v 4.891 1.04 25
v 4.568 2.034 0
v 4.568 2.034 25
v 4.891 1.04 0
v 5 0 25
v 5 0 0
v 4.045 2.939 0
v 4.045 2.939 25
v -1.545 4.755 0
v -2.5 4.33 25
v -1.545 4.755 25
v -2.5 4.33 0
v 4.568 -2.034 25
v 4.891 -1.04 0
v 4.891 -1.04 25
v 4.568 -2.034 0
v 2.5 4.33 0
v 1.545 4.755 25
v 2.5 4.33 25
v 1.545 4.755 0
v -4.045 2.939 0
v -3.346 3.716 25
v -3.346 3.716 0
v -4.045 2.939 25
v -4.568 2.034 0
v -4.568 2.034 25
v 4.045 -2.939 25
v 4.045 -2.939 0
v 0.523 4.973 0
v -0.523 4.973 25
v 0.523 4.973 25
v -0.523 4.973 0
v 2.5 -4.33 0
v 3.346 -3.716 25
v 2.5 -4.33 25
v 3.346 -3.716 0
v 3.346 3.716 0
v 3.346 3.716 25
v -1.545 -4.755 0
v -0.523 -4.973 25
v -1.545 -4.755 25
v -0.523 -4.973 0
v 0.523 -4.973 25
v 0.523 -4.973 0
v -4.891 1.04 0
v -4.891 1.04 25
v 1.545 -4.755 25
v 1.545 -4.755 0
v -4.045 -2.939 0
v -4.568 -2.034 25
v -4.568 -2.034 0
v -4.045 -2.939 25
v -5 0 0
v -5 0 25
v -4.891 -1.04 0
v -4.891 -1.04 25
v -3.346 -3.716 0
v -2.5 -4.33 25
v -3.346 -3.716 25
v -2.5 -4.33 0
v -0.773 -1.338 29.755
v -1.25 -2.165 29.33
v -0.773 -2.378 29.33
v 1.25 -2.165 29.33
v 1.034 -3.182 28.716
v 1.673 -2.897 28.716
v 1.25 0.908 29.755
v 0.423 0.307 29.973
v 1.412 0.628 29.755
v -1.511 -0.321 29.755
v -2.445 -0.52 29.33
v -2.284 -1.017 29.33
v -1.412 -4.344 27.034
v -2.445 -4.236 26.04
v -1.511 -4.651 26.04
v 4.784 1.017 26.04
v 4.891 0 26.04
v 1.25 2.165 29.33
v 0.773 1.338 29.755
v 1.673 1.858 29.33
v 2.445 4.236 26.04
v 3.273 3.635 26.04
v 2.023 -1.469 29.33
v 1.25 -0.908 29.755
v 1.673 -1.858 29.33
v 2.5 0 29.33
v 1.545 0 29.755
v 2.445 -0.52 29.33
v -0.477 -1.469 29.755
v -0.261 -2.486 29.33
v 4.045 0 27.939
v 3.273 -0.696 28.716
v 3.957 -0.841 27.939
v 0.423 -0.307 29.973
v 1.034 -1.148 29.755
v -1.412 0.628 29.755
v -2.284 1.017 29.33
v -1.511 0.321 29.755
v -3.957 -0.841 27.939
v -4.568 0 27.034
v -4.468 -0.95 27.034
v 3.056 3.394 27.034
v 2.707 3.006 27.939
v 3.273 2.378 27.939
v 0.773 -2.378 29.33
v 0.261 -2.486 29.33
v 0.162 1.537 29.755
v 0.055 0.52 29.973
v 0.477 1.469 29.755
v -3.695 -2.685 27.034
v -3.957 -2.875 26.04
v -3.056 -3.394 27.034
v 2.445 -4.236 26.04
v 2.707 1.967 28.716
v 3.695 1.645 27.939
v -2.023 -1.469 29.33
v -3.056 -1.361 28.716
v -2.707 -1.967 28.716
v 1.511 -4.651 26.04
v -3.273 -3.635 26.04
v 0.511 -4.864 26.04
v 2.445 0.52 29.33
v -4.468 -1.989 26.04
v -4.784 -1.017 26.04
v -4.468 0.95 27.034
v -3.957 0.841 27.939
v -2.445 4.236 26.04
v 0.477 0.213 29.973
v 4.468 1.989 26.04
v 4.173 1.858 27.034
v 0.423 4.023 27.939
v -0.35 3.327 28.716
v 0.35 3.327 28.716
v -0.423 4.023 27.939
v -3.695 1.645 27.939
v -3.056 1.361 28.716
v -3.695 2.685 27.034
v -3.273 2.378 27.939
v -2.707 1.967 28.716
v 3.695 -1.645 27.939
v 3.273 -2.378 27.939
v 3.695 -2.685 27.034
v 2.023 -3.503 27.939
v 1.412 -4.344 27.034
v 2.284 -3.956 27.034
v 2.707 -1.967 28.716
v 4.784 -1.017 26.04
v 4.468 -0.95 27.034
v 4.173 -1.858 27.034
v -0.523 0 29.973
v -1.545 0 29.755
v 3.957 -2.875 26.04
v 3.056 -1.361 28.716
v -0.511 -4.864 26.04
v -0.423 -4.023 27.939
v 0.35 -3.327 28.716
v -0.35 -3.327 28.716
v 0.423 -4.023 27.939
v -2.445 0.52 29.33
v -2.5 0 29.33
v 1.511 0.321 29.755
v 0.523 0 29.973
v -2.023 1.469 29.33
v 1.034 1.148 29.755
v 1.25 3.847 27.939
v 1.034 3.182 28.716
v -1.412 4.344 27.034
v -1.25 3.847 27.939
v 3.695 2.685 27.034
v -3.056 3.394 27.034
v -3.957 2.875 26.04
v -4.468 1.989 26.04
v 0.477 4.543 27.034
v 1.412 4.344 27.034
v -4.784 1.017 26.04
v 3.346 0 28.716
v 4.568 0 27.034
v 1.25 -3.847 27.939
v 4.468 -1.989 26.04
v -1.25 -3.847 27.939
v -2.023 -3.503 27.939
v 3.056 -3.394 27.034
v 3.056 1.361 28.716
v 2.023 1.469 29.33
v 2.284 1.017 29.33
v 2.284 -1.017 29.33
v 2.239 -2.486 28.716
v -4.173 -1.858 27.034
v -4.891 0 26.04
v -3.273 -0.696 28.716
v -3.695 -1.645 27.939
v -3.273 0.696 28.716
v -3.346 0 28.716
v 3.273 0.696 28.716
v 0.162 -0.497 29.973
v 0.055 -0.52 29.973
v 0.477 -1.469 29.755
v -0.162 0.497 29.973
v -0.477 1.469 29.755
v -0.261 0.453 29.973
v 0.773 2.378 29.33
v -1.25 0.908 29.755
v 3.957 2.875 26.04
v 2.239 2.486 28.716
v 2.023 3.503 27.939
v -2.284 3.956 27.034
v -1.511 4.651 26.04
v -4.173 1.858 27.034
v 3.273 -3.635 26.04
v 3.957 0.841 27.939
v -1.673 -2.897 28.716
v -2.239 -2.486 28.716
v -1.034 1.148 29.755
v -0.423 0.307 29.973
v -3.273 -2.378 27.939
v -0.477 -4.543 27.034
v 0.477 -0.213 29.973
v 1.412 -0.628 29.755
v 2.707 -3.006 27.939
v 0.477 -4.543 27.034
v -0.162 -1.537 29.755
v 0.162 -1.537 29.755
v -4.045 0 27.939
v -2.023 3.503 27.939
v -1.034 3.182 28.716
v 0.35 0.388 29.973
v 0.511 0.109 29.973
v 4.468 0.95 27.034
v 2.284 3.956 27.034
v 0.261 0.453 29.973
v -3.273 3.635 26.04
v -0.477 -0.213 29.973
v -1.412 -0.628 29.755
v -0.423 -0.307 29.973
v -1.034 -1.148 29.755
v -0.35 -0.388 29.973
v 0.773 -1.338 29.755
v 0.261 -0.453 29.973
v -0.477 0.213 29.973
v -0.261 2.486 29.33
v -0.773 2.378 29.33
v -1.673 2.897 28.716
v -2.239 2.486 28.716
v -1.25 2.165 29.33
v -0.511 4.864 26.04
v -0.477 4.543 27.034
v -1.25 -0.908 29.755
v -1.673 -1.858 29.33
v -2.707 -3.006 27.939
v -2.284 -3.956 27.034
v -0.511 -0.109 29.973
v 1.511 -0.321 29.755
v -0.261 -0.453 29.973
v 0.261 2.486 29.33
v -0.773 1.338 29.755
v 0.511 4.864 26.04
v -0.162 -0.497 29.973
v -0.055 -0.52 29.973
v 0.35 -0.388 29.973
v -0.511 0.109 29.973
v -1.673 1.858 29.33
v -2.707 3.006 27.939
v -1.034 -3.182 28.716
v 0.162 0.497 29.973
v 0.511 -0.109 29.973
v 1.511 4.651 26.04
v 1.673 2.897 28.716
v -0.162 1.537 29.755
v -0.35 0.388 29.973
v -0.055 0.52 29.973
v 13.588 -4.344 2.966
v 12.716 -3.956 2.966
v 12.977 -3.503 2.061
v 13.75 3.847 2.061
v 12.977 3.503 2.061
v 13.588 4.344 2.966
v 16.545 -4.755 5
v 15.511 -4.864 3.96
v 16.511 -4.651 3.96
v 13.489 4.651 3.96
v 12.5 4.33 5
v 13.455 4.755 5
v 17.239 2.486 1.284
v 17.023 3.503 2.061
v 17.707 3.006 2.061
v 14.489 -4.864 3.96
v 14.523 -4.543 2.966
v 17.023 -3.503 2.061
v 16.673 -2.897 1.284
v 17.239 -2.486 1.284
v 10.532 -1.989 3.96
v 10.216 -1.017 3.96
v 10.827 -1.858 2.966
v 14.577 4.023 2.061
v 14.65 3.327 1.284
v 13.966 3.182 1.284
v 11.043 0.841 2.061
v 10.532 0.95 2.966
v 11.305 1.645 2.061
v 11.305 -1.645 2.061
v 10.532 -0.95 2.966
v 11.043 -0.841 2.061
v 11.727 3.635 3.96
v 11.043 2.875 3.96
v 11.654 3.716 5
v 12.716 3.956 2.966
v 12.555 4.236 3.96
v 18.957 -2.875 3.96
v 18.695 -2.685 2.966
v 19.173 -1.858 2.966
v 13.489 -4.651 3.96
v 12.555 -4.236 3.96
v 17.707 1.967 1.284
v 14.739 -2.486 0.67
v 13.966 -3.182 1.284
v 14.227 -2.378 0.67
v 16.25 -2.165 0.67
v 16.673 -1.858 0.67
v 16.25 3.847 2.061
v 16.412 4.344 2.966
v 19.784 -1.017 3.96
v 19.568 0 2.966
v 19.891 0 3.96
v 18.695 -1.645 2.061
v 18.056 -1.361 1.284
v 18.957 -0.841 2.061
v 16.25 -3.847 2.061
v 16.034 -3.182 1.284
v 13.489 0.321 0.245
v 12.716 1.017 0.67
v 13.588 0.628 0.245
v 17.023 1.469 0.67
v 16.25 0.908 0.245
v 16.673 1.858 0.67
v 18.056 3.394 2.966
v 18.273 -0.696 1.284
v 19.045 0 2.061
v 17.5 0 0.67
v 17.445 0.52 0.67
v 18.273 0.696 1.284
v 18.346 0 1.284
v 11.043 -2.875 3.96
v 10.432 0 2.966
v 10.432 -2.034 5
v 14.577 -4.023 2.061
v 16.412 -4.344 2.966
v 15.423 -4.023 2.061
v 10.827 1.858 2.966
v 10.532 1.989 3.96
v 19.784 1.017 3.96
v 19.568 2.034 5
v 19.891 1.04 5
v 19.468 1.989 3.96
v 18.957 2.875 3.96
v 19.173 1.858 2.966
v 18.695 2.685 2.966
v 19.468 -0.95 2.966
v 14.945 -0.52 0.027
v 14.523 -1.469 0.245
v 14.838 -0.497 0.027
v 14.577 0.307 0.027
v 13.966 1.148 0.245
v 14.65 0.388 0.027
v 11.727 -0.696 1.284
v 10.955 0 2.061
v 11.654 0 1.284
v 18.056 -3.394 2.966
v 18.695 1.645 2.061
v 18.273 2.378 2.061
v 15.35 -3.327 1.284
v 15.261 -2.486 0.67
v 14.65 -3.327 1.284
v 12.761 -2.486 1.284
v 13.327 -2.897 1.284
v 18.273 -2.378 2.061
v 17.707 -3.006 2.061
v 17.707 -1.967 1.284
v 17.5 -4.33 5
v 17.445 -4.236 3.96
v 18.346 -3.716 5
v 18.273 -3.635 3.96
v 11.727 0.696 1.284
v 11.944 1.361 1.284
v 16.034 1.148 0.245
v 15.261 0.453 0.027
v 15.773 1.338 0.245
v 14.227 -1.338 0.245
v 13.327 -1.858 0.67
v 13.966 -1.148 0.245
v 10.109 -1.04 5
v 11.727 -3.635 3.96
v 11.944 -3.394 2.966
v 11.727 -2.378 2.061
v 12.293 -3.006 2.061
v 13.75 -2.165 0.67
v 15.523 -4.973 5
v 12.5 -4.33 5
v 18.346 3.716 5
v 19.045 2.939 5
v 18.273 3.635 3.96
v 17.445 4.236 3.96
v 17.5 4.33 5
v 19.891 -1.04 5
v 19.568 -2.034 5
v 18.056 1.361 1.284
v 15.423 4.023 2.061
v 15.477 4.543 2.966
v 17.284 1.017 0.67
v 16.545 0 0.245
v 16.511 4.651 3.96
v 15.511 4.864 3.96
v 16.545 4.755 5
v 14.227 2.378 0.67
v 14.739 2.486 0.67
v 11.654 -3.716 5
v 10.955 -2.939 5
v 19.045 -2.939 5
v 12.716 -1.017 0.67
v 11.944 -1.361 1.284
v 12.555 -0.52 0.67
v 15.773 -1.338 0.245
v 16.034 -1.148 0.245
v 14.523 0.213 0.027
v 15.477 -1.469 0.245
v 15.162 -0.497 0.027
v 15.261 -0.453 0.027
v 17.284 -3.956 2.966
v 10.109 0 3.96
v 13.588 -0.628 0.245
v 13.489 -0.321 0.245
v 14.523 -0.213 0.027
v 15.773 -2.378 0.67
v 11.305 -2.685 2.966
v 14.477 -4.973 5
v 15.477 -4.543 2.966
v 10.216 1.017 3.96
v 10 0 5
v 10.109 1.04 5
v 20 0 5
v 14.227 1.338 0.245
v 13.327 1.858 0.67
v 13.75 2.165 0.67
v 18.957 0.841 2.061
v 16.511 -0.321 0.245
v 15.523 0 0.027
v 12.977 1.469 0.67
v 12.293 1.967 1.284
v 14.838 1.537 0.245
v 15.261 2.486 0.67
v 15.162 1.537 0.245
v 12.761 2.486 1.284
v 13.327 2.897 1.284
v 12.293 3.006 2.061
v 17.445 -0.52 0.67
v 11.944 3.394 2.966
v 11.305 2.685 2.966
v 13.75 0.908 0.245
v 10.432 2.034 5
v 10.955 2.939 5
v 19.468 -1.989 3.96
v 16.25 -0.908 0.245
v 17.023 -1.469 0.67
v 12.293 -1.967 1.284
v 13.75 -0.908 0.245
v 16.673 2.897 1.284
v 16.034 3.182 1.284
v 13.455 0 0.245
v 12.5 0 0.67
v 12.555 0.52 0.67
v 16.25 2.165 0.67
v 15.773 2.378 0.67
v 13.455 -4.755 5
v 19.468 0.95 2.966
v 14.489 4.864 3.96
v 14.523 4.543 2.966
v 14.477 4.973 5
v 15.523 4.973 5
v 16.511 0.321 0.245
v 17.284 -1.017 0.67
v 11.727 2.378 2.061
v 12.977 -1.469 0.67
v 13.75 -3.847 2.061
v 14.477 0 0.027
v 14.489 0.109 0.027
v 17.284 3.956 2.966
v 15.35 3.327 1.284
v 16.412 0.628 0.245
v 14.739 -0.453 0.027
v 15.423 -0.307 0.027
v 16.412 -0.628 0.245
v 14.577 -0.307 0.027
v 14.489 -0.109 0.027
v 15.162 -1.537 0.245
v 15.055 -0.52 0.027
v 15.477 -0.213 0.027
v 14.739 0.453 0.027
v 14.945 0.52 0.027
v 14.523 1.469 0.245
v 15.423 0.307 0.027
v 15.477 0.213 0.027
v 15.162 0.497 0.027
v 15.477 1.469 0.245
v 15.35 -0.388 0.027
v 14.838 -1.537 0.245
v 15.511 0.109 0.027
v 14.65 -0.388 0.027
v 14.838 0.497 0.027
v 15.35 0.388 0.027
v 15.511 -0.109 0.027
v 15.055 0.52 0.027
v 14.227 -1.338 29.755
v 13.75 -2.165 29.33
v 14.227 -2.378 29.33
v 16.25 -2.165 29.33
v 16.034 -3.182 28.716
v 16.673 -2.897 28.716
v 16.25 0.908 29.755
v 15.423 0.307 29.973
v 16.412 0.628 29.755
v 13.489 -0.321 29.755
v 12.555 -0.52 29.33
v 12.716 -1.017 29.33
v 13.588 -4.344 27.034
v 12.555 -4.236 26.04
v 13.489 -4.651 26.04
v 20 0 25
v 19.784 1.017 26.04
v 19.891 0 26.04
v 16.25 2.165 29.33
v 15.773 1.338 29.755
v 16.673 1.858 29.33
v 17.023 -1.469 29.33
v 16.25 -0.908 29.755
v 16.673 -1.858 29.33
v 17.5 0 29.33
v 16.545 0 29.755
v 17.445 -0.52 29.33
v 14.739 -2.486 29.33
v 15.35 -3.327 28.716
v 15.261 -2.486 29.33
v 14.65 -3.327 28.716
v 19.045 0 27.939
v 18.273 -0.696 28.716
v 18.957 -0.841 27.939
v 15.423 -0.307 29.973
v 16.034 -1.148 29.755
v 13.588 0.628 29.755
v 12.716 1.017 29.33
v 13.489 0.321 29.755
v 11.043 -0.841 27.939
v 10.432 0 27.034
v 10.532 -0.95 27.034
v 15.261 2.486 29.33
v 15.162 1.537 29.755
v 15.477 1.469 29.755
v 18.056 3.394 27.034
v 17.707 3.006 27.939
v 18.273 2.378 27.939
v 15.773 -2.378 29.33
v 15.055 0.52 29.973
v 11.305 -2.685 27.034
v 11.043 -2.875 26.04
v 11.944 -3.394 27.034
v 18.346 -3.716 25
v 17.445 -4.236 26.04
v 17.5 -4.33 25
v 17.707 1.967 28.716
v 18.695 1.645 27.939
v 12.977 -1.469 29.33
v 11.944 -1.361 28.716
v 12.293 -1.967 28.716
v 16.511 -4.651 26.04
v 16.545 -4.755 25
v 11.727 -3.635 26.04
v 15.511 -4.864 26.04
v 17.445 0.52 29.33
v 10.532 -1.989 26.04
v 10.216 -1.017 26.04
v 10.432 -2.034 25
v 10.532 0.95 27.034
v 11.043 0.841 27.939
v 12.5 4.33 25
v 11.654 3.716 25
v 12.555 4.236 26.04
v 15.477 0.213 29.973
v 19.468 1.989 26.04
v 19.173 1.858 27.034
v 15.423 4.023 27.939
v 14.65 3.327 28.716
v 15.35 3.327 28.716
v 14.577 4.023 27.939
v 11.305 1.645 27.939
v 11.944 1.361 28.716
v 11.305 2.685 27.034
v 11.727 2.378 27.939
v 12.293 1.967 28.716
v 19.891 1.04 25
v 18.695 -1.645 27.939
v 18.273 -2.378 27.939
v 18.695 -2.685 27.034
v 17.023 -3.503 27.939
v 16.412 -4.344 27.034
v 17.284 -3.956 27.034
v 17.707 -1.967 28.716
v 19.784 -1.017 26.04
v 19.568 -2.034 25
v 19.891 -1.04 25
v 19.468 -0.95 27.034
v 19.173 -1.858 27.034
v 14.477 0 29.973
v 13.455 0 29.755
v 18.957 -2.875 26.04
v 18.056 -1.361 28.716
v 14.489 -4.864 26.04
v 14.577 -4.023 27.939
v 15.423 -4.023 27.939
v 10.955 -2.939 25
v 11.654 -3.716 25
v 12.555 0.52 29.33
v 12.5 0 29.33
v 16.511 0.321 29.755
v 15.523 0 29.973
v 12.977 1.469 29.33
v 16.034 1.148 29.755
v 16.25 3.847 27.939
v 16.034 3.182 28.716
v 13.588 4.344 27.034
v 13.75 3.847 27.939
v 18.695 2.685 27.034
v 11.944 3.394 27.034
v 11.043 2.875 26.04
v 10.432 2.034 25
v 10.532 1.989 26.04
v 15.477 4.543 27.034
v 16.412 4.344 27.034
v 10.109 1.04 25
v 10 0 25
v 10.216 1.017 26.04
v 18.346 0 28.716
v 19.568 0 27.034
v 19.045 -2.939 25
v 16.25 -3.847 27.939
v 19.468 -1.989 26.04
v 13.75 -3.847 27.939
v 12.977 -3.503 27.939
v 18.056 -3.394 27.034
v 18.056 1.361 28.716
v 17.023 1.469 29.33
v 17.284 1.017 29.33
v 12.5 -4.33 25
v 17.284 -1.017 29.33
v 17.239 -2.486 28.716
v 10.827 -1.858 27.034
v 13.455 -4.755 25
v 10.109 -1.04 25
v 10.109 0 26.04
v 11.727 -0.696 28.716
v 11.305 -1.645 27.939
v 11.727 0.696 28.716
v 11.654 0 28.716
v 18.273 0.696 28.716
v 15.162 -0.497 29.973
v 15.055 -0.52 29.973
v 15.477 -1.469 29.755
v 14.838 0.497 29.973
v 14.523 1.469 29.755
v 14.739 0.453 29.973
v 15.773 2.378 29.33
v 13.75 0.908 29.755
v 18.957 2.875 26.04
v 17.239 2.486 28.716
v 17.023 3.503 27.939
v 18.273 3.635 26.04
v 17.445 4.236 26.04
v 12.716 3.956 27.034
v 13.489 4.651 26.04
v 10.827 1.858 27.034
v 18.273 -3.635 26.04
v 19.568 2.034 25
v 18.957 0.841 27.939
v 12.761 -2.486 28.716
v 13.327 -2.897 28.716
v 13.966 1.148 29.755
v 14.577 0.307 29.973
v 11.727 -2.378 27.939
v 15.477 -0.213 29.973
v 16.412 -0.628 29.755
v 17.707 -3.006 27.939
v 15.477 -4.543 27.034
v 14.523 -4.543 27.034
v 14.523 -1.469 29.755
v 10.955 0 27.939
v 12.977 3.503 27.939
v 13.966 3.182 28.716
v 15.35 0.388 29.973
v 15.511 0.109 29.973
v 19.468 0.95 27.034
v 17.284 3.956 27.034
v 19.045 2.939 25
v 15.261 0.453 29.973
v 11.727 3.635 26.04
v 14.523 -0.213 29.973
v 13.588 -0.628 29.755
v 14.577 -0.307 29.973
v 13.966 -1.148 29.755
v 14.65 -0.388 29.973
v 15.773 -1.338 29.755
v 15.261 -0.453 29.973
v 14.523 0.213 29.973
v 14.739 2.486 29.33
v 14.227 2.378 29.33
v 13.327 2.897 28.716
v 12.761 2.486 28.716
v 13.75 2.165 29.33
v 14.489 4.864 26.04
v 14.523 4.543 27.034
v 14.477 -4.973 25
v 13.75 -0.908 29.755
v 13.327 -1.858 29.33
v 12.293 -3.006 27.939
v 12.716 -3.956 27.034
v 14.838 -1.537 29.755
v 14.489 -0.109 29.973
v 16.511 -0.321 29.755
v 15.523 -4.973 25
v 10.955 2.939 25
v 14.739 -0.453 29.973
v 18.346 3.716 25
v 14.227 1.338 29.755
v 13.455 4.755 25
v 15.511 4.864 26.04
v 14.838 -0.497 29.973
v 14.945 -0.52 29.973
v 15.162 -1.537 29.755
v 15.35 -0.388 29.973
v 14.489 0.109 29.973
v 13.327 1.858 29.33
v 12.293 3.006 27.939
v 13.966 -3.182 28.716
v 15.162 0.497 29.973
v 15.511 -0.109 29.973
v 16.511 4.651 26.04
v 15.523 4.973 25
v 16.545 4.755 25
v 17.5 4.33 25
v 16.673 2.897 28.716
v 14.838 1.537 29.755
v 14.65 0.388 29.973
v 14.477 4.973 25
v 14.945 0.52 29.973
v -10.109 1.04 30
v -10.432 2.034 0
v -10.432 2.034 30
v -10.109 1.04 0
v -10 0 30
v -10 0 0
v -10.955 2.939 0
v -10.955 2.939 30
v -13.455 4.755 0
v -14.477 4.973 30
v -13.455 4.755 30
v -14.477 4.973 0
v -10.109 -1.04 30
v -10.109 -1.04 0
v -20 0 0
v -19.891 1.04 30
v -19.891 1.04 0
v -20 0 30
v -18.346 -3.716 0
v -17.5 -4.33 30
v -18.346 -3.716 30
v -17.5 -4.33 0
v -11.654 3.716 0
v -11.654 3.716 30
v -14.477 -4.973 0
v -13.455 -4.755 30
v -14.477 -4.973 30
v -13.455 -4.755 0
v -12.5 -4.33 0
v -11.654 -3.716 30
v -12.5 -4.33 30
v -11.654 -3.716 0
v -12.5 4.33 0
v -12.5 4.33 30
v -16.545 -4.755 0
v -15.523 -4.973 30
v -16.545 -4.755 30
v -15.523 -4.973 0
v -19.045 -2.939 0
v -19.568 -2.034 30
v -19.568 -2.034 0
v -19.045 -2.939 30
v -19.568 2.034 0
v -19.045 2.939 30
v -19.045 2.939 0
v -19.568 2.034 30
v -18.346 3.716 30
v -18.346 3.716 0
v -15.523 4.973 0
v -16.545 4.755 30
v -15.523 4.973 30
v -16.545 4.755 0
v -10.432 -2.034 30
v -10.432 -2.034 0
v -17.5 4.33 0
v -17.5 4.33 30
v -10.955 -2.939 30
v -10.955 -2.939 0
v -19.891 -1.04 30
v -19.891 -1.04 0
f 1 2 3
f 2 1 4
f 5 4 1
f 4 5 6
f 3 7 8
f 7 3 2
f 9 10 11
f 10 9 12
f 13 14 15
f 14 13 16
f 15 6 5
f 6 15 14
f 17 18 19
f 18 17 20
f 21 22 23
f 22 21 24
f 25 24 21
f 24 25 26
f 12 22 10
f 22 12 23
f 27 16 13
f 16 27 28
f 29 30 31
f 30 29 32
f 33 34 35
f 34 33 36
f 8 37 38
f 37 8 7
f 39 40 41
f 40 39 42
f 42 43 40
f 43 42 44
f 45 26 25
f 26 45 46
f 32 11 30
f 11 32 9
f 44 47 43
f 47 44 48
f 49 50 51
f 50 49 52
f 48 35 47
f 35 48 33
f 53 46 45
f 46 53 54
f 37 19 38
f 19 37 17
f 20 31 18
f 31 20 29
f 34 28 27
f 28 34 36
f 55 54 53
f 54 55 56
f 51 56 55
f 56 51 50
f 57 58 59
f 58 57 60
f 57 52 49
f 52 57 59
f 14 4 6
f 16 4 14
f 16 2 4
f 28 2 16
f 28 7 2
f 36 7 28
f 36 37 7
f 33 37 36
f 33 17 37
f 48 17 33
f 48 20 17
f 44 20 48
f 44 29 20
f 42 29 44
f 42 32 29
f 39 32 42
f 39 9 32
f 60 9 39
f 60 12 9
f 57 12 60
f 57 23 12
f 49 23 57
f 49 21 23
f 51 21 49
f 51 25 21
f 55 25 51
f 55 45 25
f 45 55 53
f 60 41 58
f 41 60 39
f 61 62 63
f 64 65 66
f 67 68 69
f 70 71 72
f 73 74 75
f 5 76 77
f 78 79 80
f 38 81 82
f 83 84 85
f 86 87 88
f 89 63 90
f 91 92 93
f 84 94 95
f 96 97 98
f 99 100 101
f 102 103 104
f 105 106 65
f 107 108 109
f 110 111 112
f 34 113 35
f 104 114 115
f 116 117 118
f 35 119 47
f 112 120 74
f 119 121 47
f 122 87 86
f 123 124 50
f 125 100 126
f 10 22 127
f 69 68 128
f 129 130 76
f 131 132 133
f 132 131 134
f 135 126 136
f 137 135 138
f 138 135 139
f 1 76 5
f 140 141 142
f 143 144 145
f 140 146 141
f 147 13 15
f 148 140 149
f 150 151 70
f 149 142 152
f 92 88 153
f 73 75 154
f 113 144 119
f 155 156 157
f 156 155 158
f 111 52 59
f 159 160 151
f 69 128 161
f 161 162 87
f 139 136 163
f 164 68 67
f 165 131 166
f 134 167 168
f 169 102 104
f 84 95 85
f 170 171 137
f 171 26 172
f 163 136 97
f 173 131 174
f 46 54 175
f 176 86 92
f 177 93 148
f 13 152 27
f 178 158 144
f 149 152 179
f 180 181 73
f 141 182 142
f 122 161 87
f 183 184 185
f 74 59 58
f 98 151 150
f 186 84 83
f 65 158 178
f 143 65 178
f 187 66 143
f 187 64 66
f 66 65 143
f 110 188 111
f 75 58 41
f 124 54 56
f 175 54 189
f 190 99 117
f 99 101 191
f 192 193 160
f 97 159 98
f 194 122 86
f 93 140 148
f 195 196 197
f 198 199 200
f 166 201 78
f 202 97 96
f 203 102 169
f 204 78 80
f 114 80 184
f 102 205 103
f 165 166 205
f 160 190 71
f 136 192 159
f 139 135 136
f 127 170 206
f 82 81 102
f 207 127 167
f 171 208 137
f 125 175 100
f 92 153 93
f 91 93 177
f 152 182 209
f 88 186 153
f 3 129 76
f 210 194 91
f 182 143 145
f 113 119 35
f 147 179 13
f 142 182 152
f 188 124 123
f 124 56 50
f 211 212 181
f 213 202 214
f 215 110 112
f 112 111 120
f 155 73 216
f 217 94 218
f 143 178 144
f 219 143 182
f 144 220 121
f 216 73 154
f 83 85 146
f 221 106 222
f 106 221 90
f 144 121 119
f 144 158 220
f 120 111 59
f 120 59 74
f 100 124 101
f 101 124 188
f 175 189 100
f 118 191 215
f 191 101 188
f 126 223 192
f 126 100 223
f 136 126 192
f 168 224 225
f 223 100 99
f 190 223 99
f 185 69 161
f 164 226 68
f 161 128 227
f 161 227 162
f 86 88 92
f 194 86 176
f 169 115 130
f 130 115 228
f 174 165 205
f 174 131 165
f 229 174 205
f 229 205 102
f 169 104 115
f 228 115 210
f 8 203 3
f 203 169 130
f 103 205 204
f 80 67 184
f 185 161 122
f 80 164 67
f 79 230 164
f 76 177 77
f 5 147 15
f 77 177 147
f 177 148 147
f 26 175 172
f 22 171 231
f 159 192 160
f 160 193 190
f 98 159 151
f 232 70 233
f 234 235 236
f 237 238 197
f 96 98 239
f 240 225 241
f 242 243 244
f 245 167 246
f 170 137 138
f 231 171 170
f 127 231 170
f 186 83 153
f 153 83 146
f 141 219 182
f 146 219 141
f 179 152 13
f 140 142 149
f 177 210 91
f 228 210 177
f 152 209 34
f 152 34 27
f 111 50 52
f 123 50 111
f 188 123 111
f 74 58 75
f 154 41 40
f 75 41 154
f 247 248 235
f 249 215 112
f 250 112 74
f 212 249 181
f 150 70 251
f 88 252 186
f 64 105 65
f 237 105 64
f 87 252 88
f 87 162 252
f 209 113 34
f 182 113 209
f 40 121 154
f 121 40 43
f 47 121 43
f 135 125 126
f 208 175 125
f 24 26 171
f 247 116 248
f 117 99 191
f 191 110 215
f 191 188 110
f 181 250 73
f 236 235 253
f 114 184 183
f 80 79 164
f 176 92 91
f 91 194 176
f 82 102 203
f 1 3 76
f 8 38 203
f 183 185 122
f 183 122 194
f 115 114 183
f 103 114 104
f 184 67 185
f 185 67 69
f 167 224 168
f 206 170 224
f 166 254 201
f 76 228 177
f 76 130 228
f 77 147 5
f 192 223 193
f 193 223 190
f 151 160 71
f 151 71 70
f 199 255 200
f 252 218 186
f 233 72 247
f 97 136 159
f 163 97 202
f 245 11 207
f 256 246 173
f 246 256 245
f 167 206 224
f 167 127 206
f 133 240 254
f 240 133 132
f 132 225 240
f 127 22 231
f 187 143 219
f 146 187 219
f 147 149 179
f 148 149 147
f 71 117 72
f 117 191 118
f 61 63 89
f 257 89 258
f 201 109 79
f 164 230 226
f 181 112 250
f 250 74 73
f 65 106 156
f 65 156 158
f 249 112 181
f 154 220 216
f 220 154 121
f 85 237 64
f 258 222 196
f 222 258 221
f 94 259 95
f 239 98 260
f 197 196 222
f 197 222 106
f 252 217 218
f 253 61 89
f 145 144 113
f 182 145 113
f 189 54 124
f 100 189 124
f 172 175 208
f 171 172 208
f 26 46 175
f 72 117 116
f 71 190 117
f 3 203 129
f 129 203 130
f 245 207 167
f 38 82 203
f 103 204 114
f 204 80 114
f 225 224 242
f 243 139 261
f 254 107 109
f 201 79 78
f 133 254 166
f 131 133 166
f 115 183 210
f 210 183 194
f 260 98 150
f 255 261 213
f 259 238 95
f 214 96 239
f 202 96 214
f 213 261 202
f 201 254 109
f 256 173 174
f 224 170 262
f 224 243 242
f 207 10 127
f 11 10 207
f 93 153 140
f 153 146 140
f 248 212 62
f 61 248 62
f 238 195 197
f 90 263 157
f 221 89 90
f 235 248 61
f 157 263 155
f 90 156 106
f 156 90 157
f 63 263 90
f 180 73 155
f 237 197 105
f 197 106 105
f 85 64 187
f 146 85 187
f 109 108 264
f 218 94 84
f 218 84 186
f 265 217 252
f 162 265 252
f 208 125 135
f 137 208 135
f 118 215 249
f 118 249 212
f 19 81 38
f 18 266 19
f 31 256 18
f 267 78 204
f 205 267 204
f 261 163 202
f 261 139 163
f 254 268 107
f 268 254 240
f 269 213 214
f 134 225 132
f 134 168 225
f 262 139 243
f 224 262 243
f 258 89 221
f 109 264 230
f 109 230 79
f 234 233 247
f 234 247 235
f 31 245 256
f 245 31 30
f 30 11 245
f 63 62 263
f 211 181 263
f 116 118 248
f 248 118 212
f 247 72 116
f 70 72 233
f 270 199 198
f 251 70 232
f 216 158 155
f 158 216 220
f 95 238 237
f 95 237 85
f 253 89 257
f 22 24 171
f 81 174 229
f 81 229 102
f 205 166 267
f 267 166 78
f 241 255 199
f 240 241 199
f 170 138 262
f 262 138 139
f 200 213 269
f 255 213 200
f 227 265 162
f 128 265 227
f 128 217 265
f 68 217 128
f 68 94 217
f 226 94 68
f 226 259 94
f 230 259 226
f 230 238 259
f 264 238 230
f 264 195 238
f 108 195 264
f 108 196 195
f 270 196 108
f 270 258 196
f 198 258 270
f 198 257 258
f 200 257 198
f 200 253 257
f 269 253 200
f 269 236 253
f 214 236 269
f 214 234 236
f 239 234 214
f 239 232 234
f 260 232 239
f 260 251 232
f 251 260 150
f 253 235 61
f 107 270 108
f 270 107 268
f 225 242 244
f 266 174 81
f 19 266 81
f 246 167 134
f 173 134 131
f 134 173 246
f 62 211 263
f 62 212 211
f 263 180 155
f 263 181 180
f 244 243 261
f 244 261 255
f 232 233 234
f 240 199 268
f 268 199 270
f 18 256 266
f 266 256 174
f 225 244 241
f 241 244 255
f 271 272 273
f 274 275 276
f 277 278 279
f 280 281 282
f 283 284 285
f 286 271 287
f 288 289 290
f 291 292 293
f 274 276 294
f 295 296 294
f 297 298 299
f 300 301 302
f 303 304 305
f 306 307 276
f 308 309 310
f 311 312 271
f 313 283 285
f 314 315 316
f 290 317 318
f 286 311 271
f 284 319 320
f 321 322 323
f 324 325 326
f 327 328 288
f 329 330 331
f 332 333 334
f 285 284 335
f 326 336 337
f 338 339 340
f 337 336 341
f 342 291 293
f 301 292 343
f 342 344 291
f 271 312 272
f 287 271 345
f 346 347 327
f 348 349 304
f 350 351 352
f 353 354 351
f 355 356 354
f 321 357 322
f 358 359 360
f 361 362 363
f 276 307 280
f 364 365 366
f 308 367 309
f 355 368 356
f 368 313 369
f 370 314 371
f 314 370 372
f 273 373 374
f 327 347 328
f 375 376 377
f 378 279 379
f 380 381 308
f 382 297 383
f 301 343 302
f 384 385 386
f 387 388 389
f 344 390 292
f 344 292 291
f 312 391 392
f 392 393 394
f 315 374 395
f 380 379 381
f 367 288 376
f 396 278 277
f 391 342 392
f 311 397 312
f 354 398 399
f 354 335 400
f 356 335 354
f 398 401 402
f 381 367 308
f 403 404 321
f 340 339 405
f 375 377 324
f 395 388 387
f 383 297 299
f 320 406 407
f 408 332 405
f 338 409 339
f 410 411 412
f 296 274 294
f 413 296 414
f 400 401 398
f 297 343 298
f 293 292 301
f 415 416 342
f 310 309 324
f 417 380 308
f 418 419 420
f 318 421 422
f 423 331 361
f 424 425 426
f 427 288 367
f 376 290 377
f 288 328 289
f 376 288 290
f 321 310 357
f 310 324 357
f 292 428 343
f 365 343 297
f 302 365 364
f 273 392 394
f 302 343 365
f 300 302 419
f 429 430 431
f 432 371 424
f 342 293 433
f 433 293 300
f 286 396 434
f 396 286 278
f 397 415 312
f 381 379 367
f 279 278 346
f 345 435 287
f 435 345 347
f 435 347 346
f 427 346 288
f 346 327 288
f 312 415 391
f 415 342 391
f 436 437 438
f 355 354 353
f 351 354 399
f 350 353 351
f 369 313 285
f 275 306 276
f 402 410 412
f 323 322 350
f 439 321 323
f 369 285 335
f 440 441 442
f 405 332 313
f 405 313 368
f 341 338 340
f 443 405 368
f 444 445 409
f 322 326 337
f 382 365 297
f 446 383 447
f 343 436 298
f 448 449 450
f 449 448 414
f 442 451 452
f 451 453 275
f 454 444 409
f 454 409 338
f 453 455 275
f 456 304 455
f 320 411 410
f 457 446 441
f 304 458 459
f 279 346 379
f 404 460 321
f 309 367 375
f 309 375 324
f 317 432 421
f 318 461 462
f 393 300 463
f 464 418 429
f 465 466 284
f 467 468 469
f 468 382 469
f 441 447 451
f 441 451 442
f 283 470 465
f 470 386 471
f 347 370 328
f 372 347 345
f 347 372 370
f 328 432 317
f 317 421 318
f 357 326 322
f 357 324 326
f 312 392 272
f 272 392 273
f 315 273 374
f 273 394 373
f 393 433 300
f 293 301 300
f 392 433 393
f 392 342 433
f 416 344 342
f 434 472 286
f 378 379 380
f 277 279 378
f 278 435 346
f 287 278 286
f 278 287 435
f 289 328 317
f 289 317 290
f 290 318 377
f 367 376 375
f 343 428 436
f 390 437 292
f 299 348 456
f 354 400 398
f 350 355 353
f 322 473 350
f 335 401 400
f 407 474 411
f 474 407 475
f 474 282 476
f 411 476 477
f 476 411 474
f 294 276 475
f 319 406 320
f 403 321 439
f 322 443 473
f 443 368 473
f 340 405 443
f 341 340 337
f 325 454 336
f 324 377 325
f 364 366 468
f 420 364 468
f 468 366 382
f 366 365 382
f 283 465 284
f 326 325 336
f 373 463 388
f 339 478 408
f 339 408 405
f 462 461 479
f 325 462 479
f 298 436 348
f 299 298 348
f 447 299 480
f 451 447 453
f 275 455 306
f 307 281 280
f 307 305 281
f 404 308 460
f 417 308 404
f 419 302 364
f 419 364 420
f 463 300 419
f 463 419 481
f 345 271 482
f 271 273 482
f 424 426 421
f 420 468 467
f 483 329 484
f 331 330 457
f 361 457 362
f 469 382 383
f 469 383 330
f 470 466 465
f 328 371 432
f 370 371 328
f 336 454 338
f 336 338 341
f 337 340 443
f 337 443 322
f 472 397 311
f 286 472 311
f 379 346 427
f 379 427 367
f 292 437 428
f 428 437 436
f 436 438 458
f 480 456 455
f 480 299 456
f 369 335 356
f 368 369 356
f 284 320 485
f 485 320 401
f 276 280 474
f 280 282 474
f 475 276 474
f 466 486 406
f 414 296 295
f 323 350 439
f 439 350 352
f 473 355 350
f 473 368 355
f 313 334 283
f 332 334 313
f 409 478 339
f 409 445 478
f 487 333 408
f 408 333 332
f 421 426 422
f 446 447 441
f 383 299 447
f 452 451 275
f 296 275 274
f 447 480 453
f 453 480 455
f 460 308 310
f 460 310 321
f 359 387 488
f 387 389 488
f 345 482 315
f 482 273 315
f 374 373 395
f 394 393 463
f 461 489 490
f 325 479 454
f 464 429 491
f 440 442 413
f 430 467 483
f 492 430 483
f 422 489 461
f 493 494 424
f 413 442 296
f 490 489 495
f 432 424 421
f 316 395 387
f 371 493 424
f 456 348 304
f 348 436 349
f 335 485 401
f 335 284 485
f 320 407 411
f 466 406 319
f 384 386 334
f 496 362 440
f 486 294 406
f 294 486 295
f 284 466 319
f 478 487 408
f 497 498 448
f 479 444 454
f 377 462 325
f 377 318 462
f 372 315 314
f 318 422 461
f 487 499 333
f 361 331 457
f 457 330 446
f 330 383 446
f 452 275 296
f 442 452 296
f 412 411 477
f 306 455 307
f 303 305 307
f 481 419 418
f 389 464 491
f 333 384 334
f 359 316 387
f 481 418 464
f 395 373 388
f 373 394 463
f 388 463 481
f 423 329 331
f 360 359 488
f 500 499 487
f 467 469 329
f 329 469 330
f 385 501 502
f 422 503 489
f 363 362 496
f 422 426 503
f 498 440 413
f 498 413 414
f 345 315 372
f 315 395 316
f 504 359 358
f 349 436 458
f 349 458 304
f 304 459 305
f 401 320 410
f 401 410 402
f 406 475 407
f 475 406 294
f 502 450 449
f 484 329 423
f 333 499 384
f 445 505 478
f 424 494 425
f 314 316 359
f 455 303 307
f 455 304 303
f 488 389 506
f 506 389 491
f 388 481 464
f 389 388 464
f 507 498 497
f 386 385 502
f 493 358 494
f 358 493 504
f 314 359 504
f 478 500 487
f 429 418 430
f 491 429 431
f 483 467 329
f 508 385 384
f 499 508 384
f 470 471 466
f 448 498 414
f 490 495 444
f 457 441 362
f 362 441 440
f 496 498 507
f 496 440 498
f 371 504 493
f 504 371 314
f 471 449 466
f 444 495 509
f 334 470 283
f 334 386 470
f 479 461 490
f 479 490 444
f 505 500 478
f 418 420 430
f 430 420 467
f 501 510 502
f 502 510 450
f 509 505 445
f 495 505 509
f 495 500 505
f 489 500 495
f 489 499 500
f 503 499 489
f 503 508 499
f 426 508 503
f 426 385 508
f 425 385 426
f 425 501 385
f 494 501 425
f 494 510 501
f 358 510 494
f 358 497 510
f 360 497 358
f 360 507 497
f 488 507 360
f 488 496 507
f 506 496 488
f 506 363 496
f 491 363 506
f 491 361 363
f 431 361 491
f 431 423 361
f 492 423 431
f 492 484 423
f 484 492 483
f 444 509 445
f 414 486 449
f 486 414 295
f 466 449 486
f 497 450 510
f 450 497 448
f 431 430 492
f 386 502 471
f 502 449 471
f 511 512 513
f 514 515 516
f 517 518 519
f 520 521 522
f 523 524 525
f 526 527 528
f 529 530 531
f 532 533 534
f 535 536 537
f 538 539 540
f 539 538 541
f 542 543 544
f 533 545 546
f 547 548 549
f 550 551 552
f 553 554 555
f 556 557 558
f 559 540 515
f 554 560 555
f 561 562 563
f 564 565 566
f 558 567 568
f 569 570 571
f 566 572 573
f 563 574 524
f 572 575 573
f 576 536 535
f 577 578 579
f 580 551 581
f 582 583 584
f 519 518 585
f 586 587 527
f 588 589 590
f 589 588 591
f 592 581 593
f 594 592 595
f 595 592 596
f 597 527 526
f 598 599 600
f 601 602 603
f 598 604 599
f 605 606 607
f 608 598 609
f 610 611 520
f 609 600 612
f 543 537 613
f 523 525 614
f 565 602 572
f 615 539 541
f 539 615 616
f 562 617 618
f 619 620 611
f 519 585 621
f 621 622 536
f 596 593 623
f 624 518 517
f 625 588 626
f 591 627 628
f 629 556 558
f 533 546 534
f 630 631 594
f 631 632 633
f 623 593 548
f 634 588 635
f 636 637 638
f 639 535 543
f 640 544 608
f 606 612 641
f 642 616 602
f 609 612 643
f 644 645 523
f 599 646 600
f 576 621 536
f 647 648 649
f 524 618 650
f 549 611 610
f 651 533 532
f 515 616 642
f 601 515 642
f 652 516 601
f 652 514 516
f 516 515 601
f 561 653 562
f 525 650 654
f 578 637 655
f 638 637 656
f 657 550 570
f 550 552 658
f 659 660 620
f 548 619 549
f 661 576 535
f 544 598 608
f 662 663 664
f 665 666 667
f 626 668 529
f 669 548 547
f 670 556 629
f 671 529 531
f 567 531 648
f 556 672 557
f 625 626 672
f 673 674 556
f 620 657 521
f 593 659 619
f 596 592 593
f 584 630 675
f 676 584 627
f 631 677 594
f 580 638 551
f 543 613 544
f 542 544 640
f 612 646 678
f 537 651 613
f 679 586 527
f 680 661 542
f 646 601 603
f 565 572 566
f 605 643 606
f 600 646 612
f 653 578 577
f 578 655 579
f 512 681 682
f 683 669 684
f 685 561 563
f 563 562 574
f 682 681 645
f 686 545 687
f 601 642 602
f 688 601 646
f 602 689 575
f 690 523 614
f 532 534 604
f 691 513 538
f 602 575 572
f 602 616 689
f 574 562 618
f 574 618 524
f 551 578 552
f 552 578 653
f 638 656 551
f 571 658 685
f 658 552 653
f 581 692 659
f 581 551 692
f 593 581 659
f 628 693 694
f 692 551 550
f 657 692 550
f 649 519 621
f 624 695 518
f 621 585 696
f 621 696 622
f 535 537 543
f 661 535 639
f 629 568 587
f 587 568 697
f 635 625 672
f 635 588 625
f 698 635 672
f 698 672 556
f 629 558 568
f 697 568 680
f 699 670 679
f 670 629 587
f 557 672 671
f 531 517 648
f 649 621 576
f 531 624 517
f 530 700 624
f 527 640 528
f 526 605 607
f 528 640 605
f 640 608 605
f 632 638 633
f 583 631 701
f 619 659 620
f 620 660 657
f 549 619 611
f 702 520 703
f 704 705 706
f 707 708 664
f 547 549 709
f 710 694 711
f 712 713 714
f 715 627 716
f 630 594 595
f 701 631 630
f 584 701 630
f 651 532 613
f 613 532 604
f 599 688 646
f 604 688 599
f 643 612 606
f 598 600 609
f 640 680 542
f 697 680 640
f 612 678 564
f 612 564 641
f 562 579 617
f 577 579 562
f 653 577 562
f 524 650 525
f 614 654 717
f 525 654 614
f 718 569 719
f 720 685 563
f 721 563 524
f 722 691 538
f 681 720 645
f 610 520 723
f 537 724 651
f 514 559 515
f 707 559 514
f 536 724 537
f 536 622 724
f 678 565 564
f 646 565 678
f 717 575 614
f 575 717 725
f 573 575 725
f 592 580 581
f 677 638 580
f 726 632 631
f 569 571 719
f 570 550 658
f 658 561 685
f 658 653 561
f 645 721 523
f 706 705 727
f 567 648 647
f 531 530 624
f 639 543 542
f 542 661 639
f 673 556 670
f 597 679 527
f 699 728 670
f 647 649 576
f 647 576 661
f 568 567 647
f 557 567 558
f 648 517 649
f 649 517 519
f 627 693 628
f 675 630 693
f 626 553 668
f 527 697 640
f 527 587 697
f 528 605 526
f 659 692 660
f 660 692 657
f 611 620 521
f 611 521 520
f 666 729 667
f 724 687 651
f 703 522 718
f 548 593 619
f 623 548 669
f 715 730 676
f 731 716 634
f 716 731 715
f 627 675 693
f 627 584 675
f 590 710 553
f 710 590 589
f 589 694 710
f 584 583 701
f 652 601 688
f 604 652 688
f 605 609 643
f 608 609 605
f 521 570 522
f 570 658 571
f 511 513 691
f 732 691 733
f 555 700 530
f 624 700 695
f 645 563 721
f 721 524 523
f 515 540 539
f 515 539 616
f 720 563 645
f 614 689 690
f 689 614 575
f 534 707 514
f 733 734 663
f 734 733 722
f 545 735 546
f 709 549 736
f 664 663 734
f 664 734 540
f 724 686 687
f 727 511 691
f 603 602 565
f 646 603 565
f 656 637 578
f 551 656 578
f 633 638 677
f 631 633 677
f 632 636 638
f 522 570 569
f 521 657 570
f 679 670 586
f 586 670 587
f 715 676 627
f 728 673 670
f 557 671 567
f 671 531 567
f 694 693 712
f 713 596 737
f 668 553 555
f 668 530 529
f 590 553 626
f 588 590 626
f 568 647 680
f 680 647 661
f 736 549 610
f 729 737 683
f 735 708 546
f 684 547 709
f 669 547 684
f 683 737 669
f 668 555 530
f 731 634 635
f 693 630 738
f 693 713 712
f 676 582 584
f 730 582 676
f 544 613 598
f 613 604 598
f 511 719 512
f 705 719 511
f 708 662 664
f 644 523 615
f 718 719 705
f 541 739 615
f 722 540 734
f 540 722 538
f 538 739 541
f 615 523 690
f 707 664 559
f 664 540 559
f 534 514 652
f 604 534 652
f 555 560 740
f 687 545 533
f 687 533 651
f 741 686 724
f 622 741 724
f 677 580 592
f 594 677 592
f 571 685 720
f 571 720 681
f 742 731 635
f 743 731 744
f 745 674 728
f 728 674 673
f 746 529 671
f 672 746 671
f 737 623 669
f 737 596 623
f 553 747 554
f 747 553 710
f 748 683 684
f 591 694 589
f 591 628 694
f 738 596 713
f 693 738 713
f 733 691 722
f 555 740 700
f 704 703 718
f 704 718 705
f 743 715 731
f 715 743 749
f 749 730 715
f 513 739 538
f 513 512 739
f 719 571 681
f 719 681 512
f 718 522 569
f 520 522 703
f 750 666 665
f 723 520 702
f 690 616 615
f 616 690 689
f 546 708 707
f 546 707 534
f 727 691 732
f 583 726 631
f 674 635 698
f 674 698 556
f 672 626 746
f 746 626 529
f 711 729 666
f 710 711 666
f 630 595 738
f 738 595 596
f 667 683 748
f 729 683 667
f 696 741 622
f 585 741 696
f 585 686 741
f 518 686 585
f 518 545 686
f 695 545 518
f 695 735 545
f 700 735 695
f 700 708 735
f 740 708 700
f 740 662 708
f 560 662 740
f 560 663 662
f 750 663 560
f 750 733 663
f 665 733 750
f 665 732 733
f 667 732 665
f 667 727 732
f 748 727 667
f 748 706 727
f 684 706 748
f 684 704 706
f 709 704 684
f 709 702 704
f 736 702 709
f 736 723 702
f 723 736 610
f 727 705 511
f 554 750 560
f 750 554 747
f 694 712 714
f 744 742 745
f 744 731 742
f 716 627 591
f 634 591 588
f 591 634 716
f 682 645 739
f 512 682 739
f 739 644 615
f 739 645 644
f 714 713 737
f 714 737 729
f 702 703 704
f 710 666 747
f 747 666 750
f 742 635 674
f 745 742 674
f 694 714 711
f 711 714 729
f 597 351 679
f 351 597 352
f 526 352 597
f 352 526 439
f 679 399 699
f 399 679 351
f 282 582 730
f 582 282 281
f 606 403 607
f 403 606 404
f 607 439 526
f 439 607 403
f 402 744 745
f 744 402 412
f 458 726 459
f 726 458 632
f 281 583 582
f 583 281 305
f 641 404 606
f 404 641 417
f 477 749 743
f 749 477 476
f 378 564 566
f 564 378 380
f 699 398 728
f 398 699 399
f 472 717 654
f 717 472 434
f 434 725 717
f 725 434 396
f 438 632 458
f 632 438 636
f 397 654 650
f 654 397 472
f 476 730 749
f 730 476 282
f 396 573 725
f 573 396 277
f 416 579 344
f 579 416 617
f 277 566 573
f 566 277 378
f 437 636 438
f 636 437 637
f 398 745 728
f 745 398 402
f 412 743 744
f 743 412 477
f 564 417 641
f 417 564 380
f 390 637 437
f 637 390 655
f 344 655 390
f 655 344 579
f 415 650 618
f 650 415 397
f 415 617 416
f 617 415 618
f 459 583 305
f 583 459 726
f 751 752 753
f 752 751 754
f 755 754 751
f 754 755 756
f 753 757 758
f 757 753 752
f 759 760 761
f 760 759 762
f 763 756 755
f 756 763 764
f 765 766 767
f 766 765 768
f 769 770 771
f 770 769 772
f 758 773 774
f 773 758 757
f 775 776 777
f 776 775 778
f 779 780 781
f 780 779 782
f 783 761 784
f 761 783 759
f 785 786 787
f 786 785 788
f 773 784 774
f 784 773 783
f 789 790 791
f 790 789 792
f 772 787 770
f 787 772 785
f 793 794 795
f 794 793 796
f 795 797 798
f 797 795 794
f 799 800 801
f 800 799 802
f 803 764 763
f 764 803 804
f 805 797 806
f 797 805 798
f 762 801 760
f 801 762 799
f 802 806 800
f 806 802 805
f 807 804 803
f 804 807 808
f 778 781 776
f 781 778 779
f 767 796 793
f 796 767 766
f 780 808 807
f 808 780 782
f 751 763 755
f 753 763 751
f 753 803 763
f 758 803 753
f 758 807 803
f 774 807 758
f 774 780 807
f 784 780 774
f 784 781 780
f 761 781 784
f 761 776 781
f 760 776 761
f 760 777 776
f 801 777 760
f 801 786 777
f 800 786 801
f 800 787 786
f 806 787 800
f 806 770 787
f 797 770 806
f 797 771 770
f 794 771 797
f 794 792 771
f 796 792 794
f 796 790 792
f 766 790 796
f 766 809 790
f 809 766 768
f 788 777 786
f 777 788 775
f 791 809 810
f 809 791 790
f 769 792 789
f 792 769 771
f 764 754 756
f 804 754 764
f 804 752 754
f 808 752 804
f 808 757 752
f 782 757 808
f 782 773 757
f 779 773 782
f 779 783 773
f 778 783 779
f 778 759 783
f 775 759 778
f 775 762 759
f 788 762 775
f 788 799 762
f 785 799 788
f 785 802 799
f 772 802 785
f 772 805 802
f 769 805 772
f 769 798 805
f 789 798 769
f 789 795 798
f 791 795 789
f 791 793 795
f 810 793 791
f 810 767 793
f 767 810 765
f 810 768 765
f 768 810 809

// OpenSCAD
//-- Cilindro redondeado en las tapas
//-- Parametros:
//-- r: radio del cilindro
//-- h: Altura del cilindro
//-- center : [true, false], centrar el cilindro
//-- both: [true, false]
//--    true: Redondear ambas tapas (superior e inferior)
//--    false: solo se redondea la tapa superior
module rcylinder(r = 4, 
                 h = 20, 
                 center = false, 
                 both = false, $fn = 30)
{

  //-- Calcular la altura del cilindro interior
  //-- Si redondeo por las dos tapas, vale h - 2*r
  //-- si solo una tapa entonces h - r
  hc = (both == true) ? h - 2 * r : h - r;
  
  //-- Calcular la traslacion para centrar el cilindro
  posc = (center == true) ? 0 : h/2;
  
  //-- Aplicar traslaciopn para el centrado
  translate([0, 0, posc]) 
  
    //-- Cilindro con ambas tapas redondeadas
    //-- Se pone un cilindro de altura hc y una esfera
    //-- en la parte superior y otra en la inferior
    if (both == true) {
      cylinder(r = r, h = hc, center = true, $fn = $fn);
      
      //-- Esferas superior e inferior
      for (i = [-1, 1])
        translate([0, 0, i * hc / 2])
          sphere(r = r);
          
    }
    //-- Cilindro con tapa superior redondeada
    else
      //-- Centrar la figura
      translate([0, 0, -h/2]) {
      
        //-- Cilindro + esfera
        cylinder(r = r, h = hc, $fn = $fn);
          translate([0, 0, hc]) sphere(r = r, $fn = $fn);
      }
        
}

//-- Parametros para los ejemplos
r = 5;
h = 30;
center = false;
$fn = 30;

//-- Cilindro normal
translate([-3*r, 0, 0])  
  cylinder(r = r, h = h, center = center, $fn = $fn);

//-- Cilindro con tapa superior redondeada
rcylinder(r = r, h = h, both = false, center = center, $fn = $fn);

//-- Cilindro con ambas tapas redondeadas
translate([3*r, 0, 0])  
  rcylinder(r = r, h = h, both = true, center = center, $fn = $fn);
  
  
